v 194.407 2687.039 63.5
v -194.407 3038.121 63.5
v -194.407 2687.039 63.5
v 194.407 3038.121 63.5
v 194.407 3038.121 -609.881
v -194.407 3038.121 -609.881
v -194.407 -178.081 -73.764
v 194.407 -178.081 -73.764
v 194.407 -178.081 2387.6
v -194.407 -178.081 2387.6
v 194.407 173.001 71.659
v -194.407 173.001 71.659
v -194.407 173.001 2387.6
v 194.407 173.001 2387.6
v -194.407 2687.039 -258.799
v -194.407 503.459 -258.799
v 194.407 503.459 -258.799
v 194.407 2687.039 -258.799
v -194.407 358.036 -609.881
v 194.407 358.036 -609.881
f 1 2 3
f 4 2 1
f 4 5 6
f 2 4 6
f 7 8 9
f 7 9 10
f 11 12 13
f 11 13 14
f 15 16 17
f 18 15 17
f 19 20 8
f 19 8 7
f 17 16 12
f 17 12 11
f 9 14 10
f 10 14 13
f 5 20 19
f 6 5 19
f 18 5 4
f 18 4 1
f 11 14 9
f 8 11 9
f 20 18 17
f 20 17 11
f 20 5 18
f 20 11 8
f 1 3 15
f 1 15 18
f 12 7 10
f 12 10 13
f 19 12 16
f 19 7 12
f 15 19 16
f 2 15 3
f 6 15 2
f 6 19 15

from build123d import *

# Parameters (mm, degrees)
SKETCH2_W = 388.813364174
SKETCH2_H = 351.081799862


with BuildPart() as part:
    # Sweep1: sweep along a path in Sketch1
    with BuildLine(Plane(origin=(0, 0, 0), x_dir=(0, 0, -1), z_dir=(1, 0, 0))) as sweep1_path:
        Line((-2387.6, 0), (0, 0))
        Line((0, 0), (431.8, 431.8))
        Line((431.8, 431.8), (431.8, 2860.04))
        Line((431.8, 2860.04), (-63.5, 2860.04))
    # Sketch2 → Sweep1 (sweep)
    with BuildSketch(Plane.XY):
        with Locations((0, 2862.58)):
            Rectangle(SKETCH2_W, SKETCH2_H)
    sweep(path=sweep1_path.line, transition=Transition.RIGHT)


solid = part.part
